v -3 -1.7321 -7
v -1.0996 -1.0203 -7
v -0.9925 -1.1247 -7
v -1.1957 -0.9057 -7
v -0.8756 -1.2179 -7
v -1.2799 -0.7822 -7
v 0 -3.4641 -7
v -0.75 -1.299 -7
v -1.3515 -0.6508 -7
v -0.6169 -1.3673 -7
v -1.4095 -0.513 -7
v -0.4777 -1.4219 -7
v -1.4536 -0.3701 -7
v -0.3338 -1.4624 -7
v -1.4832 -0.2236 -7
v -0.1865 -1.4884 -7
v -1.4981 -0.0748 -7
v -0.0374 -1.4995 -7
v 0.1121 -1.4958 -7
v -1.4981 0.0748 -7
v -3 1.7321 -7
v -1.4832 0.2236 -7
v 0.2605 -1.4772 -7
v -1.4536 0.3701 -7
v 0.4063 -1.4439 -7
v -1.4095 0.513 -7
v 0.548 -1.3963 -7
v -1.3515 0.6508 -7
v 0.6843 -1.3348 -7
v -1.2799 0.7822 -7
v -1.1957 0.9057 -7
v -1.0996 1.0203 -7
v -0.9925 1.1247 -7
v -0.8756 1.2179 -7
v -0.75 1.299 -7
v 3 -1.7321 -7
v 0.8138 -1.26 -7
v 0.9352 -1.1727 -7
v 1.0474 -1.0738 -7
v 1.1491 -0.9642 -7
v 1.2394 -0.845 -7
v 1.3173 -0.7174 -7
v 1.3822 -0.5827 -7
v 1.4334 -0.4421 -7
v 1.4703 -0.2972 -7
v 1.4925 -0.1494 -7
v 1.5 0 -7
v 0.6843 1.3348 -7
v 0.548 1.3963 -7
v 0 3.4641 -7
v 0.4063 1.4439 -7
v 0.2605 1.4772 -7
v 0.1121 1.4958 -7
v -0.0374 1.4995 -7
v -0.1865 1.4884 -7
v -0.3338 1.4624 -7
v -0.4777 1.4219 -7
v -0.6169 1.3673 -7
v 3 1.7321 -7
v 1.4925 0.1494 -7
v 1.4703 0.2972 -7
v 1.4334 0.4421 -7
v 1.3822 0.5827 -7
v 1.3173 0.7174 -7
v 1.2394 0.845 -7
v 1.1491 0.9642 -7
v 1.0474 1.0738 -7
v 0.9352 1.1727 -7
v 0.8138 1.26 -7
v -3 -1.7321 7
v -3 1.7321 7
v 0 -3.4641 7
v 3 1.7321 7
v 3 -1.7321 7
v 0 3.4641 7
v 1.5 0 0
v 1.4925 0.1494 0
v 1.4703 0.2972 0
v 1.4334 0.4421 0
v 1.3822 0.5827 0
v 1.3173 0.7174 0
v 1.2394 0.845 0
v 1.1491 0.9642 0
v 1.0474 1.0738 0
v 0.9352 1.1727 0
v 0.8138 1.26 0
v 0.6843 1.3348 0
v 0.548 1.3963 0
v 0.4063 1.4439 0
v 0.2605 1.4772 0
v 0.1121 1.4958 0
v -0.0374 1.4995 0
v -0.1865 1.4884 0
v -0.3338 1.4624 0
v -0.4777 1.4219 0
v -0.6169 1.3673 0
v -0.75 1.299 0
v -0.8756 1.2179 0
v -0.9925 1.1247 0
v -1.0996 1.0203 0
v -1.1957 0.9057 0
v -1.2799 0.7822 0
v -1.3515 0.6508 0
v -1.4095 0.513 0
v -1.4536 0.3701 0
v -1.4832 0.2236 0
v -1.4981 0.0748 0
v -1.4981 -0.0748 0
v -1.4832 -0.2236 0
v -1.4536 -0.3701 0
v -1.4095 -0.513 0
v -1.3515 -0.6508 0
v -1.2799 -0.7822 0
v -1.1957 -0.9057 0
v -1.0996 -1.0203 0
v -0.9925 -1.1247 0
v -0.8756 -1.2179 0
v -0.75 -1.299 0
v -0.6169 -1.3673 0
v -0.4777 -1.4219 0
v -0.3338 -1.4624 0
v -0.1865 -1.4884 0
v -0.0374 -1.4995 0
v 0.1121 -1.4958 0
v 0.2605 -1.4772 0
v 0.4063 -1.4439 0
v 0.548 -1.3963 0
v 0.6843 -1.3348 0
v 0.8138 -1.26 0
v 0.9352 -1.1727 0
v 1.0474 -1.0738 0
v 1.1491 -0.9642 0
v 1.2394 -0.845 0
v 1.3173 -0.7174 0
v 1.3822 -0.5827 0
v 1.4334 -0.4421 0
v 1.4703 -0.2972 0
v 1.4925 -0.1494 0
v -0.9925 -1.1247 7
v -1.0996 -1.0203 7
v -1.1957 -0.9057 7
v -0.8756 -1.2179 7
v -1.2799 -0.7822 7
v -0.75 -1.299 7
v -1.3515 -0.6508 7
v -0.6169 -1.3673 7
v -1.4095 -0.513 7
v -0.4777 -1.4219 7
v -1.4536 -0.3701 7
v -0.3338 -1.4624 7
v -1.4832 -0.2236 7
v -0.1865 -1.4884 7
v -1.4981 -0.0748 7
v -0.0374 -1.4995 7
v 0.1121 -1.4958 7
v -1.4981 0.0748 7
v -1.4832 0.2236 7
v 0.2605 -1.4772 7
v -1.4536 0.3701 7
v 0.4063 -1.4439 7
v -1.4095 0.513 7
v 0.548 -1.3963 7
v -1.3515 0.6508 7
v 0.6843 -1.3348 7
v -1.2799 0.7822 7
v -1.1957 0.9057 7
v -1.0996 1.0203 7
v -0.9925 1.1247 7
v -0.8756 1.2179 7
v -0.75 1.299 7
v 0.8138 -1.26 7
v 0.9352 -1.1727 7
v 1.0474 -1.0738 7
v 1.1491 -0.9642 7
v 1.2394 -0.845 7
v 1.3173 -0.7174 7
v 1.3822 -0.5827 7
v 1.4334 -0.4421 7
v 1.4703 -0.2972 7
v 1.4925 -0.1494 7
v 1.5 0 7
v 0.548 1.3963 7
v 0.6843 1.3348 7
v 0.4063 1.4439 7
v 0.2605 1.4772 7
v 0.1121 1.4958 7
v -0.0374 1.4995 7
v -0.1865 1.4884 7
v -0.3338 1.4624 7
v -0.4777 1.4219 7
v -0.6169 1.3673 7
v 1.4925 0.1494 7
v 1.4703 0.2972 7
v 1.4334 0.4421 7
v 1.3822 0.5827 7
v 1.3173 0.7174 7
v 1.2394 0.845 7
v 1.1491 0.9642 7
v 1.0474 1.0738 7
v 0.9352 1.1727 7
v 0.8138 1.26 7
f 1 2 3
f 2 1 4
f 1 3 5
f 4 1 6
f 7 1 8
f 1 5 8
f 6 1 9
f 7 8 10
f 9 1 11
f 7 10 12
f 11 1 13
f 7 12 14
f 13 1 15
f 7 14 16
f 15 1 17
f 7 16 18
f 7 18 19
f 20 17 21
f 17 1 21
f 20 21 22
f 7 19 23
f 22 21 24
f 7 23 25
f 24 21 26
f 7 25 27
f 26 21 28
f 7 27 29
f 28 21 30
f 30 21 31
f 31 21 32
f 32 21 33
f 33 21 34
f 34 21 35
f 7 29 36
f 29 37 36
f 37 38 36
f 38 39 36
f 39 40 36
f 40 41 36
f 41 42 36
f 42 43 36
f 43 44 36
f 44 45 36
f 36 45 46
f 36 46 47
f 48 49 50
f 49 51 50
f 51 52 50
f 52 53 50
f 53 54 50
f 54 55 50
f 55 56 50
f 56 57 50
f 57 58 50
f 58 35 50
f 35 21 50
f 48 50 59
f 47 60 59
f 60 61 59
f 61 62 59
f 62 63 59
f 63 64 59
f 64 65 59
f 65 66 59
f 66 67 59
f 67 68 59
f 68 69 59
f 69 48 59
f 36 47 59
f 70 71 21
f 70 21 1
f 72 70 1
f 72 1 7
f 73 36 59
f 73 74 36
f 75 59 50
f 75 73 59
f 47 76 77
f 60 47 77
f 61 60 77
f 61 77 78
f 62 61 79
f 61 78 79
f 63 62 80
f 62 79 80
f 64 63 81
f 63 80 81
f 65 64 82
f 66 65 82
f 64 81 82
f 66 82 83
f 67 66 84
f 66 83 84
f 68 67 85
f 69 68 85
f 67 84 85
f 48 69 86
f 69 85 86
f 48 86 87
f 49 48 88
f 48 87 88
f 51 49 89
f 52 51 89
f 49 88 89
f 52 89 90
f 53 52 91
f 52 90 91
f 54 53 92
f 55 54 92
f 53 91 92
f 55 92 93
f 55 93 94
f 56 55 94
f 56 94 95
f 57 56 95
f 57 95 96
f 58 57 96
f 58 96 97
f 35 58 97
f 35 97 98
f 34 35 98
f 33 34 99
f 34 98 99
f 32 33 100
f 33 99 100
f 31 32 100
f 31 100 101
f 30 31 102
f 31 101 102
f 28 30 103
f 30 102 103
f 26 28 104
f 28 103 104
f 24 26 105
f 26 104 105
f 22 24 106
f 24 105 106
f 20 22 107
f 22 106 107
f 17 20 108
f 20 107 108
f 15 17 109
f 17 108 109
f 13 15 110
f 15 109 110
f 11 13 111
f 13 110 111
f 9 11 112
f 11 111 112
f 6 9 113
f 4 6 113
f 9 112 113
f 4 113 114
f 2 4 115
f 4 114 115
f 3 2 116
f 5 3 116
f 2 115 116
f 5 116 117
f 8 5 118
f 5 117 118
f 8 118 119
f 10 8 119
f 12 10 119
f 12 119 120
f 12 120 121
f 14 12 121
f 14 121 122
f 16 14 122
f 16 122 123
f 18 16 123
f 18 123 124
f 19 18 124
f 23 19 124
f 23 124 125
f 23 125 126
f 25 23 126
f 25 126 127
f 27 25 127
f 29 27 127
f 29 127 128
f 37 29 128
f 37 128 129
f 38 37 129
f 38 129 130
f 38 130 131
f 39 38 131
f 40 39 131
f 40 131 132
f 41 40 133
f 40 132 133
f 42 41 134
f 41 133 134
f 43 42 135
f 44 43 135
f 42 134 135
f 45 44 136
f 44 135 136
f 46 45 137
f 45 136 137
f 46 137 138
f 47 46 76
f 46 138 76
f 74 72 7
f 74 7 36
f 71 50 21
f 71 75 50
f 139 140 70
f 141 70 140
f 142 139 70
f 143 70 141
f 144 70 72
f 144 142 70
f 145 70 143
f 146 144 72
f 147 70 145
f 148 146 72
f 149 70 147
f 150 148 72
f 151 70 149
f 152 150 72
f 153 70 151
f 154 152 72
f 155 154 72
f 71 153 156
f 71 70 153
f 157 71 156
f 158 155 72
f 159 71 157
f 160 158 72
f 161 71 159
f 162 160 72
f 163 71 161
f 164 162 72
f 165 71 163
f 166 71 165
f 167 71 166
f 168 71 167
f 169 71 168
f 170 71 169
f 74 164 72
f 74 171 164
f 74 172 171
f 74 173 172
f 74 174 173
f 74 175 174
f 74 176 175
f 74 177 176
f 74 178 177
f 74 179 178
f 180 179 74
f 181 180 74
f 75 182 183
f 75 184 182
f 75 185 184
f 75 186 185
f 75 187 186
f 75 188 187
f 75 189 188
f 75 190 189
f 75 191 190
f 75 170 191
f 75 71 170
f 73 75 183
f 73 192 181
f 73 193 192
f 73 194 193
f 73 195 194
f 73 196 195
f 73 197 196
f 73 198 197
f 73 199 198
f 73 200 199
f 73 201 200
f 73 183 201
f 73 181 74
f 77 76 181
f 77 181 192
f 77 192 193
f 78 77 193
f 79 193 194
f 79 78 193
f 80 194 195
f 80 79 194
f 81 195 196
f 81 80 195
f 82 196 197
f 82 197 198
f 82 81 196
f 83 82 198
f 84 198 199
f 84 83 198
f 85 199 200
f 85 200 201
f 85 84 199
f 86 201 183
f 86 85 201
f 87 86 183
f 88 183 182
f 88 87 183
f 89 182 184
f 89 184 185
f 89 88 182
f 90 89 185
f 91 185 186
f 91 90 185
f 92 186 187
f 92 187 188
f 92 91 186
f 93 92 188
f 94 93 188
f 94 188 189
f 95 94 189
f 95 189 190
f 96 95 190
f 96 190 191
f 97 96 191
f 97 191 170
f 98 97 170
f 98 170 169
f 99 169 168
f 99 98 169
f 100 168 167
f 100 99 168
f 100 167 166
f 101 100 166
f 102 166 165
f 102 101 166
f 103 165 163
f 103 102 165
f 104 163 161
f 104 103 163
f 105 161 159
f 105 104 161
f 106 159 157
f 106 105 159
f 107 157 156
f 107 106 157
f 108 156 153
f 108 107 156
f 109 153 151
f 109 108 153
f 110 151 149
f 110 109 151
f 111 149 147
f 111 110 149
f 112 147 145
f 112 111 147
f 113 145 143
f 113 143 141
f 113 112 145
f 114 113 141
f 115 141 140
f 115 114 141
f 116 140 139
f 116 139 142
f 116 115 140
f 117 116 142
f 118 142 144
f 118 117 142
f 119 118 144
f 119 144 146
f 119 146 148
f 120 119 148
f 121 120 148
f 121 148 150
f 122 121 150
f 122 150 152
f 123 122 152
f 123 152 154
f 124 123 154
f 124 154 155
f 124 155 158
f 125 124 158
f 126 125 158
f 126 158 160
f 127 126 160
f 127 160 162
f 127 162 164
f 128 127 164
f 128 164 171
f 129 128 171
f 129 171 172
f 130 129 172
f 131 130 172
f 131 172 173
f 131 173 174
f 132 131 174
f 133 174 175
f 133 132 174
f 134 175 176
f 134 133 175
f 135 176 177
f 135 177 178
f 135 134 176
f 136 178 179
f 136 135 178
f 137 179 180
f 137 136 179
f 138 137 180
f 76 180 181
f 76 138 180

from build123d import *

# Parameters (mm, degrees)
SKETCH1_R           = 1.5
EXTRUDE1_DEPTH      = 7
EXTRUDE1_DEPTH_BACK = 7


with BuildPart() as part:
    # Sketch1 → Extrude1 (new body, two sides)
    with BuildSketch(Plane.XY) as extrude1_sk:
        Polygon((0, 3.464101615), (-3, 1.732050808), (-3, -1.732050808), (0, -3.464101615), (3, -1.732050808), (3, 1.732050808), align=None)
        Circle(SKETCH1_R, mode=Mode.SUBTRACT)
    extrude(amount=EXTRUDE1_DEPTH)
    extrude(extrude1_sk.sketch, amount=-EXTRUDE1_DEPTH_BACK)


solid = part.part
